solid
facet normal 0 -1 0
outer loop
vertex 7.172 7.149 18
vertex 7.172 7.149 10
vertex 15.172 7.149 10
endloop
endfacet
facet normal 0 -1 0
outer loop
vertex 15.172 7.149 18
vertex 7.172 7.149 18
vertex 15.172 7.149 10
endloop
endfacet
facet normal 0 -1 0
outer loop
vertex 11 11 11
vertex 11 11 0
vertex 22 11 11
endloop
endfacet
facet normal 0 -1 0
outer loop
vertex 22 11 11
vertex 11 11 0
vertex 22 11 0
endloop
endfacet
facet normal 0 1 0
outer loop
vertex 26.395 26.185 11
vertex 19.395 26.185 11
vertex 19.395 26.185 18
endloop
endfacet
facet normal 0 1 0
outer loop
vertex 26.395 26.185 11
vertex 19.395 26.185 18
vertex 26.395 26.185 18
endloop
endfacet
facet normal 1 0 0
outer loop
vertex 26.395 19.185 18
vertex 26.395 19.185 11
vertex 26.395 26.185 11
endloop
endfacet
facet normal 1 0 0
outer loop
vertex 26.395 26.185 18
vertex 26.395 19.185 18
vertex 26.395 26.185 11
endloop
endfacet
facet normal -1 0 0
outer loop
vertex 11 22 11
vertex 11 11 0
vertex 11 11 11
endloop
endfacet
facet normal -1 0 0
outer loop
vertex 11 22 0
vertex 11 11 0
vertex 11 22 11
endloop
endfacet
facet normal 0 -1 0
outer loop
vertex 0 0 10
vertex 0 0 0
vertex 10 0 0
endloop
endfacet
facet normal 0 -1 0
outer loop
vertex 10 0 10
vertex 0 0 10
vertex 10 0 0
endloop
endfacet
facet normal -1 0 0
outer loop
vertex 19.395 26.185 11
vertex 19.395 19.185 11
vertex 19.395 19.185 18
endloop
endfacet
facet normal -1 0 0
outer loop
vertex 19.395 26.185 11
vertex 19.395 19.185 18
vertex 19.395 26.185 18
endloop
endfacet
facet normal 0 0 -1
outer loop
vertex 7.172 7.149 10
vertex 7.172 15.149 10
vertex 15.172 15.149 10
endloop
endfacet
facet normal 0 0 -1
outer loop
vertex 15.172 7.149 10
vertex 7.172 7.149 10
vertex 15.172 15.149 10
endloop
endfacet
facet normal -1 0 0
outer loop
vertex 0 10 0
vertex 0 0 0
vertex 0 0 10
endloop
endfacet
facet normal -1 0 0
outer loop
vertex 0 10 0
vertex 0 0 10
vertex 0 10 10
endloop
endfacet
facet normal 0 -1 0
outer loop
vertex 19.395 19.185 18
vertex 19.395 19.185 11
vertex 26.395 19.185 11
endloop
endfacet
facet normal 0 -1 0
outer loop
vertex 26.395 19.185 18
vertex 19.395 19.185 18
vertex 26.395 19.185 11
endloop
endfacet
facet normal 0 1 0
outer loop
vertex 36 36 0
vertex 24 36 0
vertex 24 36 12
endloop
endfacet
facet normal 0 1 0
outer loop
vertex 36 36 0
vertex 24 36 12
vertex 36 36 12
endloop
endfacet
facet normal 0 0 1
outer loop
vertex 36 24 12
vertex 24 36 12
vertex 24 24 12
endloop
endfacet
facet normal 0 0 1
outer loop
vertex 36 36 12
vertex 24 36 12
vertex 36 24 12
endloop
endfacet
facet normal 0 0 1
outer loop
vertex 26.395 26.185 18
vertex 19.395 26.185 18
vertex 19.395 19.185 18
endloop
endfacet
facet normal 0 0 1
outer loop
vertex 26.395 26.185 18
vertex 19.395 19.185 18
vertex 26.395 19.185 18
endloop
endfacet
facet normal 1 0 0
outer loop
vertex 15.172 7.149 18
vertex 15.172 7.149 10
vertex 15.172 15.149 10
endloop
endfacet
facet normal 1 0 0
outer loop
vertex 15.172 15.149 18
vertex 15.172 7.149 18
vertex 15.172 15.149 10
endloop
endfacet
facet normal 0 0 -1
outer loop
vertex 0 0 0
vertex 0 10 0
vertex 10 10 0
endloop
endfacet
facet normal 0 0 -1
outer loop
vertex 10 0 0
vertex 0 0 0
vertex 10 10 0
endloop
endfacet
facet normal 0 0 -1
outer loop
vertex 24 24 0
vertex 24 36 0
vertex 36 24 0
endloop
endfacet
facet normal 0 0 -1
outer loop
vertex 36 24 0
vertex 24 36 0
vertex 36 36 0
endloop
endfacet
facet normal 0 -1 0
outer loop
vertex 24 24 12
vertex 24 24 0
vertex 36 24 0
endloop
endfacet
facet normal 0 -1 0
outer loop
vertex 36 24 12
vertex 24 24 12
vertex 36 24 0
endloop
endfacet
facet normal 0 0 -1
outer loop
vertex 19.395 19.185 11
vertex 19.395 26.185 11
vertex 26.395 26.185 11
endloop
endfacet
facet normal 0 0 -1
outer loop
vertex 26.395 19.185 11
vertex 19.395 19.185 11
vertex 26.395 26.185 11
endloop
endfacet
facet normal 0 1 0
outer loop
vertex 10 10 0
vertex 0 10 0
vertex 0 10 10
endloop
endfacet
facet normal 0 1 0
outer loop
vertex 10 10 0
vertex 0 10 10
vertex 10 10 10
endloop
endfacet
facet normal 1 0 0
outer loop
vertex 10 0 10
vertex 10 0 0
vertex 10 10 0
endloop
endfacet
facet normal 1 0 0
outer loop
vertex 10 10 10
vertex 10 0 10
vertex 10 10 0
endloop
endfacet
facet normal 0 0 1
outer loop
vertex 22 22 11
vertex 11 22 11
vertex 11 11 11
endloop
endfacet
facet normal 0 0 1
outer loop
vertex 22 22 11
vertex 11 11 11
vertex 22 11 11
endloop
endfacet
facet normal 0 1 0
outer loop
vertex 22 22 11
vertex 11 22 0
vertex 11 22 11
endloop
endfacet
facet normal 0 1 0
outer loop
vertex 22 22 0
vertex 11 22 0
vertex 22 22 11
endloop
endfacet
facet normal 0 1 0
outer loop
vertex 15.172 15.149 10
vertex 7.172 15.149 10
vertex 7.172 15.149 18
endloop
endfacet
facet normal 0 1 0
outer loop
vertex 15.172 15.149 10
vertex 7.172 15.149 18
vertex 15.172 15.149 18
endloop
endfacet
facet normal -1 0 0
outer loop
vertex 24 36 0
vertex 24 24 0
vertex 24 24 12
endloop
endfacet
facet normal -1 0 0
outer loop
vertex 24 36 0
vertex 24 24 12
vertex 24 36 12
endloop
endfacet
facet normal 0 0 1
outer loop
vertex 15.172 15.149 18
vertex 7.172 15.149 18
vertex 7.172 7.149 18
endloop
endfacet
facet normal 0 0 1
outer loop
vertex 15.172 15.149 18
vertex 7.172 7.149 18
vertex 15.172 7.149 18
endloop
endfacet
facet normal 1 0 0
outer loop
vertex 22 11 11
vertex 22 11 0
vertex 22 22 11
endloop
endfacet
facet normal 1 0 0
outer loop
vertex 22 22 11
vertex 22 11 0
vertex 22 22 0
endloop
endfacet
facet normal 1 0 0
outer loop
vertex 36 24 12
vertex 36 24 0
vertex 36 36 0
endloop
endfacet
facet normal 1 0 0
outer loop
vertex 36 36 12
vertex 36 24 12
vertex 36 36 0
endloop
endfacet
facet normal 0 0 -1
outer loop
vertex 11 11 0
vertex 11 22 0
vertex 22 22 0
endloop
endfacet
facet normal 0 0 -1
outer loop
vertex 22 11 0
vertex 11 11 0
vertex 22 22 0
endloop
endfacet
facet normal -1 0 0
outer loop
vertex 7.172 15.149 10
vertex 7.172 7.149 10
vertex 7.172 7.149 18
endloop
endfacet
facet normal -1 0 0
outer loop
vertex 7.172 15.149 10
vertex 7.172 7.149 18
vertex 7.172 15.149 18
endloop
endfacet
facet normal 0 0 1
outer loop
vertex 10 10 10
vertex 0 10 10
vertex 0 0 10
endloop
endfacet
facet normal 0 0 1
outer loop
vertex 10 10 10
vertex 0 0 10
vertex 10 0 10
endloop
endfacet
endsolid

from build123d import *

# Parameters (mm, degrees)
F0_W     = 10
F0_H     = 10
F1_DEPTH = 10
F2_W     = 11
F2_H     = 11
F3_DEPTH = 11
F4_W     = 12
F4_H     = 12
F5_DEPTH = 12
F6_W     = 8
F6_H     = 8
F7_DEPTH = 8
F8_W     = 7
F8_H     = 7
F9_DEPTH = 7


with BuildPart() as f1:
    # F0 (on Top) → F1 (new body)
    with BuildSketch(Plane.XY):
        with Locations((5, 5)):
            Rectangle(F0_W, F0_H)
    extrude(amount=F1_DEPTH)


with BuildPart() as f3:
    # F2 (on Top) → F3 (new body)
    with BuildSketch(Plane.XY):
        with Locations((16.5, 16.5)):
            Rectangle(F2_W, F2_H)
    extrude(amount=F3_DEPTH)


with BuildPart() as f5:
    # F4 (on Top) → F5 (new body)
    with BuildSketch(Plane.XY):
        with Locations((30, 30)):
            Rectangle(F4_W, F4_H)
    extrude(amount=F5_DEPTH)


with BuildPart() as f7:
    # F6 (on face) → F7 (new body)
    with BuildSketch(Plane.XY.offset(10)):
        with Locations((11.172373, 11.149319)):
            Rectangle(F6_W, F6_H)
    extrude(amount=F7_DEPTH)


with BuildPart() as f9:
    # F8 (on face) → F9 (new body)
    with BuildSketch(Plane.XY.offset(11)):
        with Locations((22.894903, 22.685262)):
            Rectangle(F8_W, F8_H)
    extrude(amount=F9_DEPTH)


solid = Compound([f1.part, f3.part, f5.part, f7.part, f9.part])
